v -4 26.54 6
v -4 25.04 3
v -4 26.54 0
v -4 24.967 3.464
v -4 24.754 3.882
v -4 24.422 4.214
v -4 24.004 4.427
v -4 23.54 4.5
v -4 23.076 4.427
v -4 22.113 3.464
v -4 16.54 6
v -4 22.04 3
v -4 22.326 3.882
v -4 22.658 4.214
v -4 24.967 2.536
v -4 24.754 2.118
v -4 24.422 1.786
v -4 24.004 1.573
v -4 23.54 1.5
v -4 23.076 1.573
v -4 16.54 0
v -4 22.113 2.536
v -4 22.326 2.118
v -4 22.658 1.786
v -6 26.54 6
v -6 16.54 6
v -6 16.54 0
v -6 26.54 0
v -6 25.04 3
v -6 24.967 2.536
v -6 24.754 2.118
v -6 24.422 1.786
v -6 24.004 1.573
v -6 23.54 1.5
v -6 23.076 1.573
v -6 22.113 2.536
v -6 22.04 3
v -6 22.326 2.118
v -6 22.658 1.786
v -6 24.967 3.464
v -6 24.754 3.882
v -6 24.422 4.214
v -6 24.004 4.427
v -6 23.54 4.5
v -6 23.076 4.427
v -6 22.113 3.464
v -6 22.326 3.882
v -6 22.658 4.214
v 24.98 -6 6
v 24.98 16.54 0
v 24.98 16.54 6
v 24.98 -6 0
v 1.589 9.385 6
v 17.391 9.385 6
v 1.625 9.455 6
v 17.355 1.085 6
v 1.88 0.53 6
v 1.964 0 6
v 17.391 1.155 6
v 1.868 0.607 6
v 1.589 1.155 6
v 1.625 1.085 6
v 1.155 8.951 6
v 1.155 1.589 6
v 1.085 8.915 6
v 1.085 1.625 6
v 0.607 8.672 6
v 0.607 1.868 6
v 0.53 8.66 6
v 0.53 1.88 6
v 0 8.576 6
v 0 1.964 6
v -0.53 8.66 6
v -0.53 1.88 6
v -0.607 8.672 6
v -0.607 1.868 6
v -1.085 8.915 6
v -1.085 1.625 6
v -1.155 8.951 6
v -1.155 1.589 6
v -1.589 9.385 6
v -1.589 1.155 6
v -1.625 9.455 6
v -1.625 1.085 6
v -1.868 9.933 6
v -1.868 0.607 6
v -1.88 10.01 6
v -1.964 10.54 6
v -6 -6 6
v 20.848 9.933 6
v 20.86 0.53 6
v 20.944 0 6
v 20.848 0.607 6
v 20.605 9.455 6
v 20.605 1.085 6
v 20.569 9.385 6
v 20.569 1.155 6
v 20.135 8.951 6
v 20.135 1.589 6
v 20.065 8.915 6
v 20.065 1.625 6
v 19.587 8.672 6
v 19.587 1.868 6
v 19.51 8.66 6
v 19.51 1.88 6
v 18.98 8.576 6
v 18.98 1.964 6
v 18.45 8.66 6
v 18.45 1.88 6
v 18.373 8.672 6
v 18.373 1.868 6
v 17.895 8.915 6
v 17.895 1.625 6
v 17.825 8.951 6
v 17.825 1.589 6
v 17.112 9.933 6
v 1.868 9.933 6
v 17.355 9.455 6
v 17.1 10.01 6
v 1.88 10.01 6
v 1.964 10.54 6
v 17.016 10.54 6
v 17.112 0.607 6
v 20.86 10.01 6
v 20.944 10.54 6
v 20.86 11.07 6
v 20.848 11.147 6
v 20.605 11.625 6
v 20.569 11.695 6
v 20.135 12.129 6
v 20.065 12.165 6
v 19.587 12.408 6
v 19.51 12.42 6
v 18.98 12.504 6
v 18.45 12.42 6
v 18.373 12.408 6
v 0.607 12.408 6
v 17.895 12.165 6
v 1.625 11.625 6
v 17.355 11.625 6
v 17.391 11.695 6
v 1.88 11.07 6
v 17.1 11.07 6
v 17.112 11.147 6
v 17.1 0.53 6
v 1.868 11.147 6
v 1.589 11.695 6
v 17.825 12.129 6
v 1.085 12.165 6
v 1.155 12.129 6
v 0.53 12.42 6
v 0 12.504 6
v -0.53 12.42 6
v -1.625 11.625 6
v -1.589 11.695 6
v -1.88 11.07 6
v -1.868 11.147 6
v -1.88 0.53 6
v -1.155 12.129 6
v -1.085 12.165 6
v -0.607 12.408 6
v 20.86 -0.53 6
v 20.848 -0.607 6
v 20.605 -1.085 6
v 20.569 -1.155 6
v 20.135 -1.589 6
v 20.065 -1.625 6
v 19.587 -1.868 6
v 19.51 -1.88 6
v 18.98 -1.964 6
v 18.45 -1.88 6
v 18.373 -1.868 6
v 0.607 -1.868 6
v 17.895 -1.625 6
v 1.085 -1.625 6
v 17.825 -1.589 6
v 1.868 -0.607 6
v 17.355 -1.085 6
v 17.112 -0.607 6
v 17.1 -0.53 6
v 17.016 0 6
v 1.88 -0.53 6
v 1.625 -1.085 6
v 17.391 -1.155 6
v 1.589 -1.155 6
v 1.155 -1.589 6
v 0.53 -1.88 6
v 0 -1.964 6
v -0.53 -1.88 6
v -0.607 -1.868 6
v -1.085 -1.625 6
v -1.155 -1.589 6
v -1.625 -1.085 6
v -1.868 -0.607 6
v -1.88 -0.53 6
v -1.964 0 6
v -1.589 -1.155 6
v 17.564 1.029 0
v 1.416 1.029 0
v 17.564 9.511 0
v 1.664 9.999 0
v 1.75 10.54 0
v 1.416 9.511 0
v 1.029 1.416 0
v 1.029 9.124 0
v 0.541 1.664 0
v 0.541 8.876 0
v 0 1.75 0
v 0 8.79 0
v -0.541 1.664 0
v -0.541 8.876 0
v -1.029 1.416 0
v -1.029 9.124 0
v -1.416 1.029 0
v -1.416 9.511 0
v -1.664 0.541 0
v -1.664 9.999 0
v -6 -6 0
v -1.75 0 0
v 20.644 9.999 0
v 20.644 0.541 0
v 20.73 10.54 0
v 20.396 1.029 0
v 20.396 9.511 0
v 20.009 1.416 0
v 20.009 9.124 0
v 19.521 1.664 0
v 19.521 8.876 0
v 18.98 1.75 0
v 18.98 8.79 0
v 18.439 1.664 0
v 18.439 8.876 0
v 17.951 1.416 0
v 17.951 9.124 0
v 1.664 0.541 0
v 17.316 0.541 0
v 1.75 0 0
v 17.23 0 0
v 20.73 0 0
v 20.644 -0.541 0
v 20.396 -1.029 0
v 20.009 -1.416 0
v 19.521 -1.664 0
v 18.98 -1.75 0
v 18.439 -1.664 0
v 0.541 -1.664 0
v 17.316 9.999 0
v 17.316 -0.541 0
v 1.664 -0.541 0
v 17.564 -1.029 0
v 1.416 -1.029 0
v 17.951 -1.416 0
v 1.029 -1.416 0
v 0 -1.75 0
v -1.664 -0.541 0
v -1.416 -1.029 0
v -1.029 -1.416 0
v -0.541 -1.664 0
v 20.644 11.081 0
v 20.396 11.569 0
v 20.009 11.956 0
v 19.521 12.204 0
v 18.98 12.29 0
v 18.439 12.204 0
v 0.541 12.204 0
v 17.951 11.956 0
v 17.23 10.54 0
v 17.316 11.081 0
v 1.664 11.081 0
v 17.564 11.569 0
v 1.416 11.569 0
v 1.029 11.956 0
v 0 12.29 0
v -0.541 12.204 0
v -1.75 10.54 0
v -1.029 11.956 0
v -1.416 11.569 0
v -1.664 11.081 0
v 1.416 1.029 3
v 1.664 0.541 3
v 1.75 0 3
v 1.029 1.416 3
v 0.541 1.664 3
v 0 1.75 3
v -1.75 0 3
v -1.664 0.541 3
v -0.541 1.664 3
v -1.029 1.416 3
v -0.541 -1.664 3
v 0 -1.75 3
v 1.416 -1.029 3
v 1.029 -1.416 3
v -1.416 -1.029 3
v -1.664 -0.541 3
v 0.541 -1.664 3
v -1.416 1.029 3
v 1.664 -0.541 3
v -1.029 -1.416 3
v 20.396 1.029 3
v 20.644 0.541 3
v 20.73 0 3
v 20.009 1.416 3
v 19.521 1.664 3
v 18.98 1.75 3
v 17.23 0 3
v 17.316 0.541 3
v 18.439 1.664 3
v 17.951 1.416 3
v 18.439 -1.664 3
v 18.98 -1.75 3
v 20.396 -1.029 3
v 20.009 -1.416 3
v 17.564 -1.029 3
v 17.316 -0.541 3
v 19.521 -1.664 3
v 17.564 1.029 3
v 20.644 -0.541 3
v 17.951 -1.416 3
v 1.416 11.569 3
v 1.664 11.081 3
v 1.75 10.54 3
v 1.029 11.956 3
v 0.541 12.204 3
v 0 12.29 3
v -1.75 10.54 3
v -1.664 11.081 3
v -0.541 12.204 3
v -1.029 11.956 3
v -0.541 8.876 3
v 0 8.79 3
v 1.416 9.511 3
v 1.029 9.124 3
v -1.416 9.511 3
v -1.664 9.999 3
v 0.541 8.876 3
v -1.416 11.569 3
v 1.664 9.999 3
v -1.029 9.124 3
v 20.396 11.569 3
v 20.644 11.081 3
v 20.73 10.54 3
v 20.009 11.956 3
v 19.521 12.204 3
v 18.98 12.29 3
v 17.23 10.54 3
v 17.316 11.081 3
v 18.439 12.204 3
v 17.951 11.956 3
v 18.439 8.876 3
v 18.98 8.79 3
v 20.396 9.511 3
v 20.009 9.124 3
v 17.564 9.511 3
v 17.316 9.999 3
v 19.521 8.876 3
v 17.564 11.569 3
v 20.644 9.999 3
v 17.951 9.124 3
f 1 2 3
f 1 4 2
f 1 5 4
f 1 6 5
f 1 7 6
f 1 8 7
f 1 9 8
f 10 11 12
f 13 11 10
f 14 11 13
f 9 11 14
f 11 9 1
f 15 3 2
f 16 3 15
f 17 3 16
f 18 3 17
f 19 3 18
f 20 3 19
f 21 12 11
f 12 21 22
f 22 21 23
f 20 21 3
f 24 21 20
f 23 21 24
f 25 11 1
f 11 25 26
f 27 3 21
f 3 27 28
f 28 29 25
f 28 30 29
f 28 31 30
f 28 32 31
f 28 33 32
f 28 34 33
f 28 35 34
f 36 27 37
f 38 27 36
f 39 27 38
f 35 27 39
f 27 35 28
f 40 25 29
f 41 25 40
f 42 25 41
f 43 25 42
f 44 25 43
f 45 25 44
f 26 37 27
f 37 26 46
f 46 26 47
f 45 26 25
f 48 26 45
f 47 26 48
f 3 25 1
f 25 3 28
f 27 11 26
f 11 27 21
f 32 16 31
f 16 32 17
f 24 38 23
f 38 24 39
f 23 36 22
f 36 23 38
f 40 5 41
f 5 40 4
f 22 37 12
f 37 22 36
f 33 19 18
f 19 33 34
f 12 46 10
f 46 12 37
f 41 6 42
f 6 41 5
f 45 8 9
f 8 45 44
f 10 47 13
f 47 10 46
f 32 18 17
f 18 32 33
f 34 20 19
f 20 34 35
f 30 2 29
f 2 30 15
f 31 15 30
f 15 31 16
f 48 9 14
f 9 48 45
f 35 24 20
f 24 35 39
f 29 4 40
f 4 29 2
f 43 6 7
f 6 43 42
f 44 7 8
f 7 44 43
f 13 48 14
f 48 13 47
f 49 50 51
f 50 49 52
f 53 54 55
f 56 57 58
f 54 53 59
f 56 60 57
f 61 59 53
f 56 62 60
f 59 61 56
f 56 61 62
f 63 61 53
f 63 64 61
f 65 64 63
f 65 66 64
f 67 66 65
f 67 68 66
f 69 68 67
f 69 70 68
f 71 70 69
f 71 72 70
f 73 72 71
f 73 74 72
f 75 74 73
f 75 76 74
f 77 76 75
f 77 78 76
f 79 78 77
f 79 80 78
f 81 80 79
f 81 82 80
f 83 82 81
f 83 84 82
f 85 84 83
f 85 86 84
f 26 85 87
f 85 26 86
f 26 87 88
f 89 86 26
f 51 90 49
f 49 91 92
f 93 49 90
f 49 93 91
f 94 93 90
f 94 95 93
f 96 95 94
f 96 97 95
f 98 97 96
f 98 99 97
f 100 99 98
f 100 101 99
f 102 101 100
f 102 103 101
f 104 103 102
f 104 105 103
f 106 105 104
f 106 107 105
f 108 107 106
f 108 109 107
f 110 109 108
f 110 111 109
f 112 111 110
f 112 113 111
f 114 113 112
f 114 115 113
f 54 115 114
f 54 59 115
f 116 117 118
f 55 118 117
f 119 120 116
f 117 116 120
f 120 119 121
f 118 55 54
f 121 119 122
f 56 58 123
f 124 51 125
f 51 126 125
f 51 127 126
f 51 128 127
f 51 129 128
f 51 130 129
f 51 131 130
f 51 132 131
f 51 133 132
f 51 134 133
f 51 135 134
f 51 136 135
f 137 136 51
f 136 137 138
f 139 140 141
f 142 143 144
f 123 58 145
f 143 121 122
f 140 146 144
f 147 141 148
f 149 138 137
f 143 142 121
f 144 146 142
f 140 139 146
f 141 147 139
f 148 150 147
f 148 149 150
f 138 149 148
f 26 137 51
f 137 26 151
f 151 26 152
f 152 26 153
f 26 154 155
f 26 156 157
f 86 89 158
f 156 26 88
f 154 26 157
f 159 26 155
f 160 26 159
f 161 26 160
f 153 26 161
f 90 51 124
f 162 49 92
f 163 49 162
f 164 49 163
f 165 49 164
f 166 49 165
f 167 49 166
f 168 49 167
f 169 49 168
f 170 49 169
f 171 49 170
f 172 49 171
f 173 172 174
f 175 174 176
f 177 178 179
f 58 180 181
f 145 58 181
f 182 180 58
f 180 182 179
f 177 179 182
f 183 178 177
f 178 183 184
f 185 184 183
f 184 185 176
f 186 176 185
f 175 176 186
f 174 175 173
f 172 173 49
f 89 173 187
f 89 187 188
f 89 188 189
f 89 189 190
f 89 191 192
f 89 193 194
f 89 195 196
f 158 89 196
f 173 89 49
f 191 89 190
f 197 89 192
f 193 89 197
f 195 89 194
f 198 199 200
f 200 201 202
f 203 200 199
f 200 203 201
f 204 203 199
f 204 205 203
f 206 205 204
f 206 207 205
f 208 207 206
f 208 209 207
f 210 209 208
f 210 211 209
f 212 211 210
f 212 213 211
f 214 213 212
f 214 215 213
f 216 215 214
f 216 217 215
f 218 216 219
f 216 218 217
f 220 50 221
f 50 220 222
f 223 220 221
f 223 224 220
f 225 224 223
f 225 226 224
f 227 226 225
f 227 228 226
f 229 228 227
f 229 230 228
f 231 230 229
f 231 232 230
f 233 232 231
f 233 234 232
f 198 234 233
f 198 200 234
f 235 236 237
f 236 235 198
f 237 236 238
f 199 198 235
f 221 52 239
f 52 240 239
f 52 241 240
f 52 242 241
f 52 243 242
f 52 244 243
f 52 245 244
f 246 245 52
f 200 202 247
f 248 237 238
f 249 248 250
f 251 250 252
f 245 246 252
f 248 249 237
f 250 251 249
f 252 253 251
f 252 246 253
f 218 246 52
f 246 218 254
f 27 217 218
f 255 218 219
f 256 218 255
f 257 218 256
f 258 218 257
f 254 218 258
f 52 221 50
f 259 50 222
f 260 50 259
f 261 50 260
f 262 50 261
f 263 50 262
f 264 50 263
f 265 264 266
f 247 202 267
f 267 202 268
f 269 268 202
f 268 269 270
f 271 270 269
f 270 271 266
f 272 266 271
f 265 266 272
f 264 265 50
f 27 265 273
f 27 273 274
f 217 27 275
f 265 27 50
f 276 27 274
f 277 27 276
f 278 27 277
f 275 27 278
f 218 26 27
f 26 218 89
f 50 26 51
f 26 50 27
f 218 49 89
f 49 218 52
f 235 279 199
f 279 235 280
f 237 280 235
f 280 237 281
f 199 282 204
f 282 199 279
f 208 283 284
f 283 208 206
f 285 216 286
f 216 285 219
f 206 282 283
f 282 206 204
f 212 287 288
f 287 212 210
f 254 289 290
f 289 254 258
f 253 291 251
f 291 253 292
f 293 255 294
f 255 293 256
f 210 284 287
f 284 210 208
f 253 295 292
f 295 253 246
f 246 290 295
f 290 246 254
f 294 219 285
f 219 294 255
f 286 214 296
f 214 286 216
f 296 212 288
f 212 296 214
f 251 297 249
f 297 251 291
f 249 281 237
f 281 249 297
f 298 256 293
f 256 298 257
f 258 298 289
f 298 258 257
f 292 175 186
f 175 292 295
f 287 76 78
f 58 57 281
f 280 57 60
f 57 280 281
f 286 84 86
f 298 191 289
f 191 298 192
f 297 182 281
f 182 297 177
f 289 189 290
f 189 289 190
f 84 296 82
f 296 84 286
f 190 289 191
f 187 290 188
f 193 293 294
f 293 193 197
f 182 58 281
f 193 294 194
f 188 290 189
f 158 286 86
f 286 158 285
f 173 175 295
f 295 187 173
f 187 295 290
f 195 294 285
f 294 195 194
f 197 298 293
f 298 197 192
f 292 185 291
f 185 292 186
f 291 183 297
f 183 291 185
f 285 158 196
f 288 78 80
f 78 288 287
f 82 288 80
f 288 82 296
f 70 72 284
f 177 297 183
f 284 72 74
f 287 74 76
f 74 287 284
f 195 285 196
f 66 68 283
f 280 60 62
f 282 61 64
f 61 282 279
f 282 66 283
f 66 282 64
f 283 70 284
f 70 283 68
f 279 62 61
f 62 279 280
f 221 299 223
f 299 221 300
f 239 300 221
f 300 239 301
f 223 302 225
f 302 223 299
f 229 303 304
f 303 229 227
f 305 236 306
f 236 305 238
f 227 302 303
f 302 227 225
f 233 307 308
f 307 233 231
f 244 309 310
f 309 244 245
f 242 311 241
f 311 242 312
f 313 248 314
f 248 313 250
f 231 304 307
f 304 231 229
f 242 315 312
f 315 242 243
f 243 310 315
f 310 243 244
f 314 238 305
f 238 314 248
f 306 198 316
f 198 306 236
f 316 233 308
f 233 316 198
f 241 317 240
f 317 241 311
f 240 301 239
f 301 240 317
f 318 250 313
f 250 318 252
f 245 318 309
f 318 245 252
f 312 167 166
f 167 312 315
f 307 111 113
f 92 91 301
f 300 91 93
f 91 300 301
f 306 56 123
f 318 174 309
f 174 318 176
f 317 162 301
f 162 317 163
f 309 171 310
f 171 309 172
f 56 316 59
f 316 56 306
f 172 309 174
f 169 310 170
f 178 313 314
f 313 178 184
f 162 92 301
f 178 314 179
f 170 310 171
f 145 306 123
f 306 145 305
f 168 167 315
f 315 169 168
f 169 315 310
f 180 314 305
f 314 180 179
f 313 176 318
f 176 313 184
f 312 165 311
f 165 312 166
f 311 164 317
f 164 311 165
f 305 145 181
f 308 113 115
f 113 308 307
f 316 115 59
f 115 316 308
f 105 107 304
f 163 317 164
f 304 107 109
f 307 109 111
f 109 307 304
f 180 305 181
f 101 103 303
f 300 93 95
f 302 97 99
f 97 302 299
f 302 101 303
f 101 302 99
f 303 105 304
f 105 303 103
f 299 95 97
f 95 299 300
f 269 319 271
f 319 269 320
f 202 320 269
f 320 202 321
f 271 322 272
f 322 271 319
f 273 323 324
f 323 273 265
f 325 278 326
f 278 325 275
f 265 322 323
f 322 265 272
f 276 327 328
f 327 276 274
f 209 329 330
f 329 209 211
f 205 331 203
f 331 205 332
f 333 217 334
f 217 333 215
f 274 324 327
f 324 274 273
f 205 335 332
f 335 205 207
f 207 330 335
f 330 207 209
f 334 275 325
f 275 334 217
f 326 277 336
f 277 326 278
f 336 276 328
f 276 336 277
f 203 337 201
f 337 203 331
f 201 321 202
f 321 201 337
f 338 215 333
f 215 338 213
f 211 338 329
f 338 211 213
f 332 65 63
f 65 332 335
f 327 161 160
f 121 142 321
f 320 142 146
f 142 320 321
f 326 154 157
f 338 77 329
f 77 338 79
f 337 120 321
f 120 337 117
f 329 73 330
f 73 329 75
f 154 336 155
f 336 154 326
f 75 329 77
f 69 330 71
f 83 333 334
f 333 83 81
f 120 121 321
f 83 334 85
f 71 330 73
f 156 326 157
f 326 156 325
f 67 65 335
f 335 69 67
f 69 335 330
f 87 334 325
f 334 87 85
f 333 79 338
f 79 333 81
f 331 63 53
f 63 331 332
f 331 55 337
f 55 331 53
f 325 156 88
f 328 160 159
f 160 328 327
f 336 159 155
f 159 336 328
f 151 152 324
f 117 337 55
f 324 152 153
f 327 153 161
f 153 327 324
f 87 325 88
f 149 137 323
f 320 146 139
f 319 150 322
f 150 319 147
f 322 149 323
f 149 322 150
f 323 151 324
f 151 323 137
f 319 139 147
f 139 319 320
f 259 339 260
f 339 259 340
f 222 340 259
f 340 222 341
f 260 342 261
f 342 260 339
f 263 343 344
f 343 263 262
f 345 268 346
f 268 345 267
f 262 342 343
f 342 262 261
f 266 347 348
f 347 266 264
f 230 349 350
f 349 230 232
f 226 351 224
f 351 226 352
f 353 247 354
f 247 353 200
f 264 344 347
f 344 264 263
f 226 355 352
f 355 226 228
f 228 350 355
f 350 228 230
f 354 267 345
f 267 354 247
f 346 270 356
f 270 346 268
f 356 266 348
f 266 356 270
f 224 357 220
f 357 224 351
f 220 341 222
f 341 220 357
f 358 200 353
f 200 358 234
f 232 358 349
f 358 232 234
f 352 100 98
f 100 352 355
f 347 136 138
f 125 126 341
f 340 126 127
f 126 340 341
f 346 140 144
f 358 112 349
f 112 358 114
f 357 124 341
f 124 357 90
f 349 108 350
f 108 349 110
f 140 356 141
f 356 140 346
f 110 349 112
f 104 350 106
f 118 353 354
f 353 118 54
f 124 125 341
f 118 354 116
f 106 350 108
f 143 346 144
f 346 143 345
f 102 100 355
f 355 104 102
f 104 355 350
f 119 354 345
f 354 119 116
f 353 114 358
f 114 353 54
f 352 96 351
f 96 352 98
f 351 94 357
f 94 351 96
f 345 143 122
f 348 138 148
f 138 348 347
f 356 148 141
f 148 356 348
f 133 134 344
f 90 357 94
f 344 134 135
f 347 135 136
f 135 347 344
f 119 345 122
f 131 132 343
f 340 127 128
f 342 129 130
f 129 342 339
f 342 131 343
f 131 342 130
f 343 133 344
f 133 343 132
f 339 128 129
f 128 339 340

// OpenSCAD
//units are in mm
$fn=20;

render_mirror = 0;
render_camera = 1;

// Epsilon value
e = 0.01;

// Wall thickness
wall = .8;

// Outer border width
border = 6;

// mirror size
mirror_length = 129;
mirror_width = 79;

box_height = 8;

camera_length_outer = 23.19;
camera_length_inner = 18.98;
camera_length = (camera_length_inner + camera_length_inner)/2;

camera_width_outer = 14.61;
camera_width_inner = 10.54;
camera_width = (camera_width_inner + camera_width_inner)/2;

module screw_container() {
    difference() {
        cube(8, center=true);
        translate([0,0,-2])
            screw_hole();
    }
}
module screw_hole() {
    union() {
        translate([0,0,-e])
            cylinder(h=100, d=3.5);
        translate([0,0,3])
            cylinder(d1=3.5, d2=4, h=3.5);
    }
}

if(render_mirror == 1) {
    union() {
        difference() {
            // Bounding box
            cube([mirror_length + border*2, mirror_width + border*2, box_height]);

            // Bottom indents
            translate([border + e, border + e, 3])
                cube([mirror_length, mirror_width, box_height]);
        }
        translate([94,0,0])
            rotate([0, 90, 0])
                translate([-4,-4,]) 
                    screw_container();
    }
}

if(render_camera == 1) {
    difference() {
        translate([-border, -border, 0]) {
            union() {
                cube([camera_length+border*2, camera_width+border*2, 6]);
                translate([0,camera_width + border*2,0]) {
                    difference() {
                        cube([2,10,6]);
                        rotate([0, 90, 0]) {
                            translate([-3,7,-e])
                                cylinder(h=6, d=3);
                        }
                    }
                }
            }
        }
        translate([0,0,0])
            screw_hole();
        translate([camera_length,0,0])
            screw_hole();
        translate([0,camera_width,0])
            screw_hole();
        translate([camera_length,camera_width,0])
            screw_hole();
    }
}
